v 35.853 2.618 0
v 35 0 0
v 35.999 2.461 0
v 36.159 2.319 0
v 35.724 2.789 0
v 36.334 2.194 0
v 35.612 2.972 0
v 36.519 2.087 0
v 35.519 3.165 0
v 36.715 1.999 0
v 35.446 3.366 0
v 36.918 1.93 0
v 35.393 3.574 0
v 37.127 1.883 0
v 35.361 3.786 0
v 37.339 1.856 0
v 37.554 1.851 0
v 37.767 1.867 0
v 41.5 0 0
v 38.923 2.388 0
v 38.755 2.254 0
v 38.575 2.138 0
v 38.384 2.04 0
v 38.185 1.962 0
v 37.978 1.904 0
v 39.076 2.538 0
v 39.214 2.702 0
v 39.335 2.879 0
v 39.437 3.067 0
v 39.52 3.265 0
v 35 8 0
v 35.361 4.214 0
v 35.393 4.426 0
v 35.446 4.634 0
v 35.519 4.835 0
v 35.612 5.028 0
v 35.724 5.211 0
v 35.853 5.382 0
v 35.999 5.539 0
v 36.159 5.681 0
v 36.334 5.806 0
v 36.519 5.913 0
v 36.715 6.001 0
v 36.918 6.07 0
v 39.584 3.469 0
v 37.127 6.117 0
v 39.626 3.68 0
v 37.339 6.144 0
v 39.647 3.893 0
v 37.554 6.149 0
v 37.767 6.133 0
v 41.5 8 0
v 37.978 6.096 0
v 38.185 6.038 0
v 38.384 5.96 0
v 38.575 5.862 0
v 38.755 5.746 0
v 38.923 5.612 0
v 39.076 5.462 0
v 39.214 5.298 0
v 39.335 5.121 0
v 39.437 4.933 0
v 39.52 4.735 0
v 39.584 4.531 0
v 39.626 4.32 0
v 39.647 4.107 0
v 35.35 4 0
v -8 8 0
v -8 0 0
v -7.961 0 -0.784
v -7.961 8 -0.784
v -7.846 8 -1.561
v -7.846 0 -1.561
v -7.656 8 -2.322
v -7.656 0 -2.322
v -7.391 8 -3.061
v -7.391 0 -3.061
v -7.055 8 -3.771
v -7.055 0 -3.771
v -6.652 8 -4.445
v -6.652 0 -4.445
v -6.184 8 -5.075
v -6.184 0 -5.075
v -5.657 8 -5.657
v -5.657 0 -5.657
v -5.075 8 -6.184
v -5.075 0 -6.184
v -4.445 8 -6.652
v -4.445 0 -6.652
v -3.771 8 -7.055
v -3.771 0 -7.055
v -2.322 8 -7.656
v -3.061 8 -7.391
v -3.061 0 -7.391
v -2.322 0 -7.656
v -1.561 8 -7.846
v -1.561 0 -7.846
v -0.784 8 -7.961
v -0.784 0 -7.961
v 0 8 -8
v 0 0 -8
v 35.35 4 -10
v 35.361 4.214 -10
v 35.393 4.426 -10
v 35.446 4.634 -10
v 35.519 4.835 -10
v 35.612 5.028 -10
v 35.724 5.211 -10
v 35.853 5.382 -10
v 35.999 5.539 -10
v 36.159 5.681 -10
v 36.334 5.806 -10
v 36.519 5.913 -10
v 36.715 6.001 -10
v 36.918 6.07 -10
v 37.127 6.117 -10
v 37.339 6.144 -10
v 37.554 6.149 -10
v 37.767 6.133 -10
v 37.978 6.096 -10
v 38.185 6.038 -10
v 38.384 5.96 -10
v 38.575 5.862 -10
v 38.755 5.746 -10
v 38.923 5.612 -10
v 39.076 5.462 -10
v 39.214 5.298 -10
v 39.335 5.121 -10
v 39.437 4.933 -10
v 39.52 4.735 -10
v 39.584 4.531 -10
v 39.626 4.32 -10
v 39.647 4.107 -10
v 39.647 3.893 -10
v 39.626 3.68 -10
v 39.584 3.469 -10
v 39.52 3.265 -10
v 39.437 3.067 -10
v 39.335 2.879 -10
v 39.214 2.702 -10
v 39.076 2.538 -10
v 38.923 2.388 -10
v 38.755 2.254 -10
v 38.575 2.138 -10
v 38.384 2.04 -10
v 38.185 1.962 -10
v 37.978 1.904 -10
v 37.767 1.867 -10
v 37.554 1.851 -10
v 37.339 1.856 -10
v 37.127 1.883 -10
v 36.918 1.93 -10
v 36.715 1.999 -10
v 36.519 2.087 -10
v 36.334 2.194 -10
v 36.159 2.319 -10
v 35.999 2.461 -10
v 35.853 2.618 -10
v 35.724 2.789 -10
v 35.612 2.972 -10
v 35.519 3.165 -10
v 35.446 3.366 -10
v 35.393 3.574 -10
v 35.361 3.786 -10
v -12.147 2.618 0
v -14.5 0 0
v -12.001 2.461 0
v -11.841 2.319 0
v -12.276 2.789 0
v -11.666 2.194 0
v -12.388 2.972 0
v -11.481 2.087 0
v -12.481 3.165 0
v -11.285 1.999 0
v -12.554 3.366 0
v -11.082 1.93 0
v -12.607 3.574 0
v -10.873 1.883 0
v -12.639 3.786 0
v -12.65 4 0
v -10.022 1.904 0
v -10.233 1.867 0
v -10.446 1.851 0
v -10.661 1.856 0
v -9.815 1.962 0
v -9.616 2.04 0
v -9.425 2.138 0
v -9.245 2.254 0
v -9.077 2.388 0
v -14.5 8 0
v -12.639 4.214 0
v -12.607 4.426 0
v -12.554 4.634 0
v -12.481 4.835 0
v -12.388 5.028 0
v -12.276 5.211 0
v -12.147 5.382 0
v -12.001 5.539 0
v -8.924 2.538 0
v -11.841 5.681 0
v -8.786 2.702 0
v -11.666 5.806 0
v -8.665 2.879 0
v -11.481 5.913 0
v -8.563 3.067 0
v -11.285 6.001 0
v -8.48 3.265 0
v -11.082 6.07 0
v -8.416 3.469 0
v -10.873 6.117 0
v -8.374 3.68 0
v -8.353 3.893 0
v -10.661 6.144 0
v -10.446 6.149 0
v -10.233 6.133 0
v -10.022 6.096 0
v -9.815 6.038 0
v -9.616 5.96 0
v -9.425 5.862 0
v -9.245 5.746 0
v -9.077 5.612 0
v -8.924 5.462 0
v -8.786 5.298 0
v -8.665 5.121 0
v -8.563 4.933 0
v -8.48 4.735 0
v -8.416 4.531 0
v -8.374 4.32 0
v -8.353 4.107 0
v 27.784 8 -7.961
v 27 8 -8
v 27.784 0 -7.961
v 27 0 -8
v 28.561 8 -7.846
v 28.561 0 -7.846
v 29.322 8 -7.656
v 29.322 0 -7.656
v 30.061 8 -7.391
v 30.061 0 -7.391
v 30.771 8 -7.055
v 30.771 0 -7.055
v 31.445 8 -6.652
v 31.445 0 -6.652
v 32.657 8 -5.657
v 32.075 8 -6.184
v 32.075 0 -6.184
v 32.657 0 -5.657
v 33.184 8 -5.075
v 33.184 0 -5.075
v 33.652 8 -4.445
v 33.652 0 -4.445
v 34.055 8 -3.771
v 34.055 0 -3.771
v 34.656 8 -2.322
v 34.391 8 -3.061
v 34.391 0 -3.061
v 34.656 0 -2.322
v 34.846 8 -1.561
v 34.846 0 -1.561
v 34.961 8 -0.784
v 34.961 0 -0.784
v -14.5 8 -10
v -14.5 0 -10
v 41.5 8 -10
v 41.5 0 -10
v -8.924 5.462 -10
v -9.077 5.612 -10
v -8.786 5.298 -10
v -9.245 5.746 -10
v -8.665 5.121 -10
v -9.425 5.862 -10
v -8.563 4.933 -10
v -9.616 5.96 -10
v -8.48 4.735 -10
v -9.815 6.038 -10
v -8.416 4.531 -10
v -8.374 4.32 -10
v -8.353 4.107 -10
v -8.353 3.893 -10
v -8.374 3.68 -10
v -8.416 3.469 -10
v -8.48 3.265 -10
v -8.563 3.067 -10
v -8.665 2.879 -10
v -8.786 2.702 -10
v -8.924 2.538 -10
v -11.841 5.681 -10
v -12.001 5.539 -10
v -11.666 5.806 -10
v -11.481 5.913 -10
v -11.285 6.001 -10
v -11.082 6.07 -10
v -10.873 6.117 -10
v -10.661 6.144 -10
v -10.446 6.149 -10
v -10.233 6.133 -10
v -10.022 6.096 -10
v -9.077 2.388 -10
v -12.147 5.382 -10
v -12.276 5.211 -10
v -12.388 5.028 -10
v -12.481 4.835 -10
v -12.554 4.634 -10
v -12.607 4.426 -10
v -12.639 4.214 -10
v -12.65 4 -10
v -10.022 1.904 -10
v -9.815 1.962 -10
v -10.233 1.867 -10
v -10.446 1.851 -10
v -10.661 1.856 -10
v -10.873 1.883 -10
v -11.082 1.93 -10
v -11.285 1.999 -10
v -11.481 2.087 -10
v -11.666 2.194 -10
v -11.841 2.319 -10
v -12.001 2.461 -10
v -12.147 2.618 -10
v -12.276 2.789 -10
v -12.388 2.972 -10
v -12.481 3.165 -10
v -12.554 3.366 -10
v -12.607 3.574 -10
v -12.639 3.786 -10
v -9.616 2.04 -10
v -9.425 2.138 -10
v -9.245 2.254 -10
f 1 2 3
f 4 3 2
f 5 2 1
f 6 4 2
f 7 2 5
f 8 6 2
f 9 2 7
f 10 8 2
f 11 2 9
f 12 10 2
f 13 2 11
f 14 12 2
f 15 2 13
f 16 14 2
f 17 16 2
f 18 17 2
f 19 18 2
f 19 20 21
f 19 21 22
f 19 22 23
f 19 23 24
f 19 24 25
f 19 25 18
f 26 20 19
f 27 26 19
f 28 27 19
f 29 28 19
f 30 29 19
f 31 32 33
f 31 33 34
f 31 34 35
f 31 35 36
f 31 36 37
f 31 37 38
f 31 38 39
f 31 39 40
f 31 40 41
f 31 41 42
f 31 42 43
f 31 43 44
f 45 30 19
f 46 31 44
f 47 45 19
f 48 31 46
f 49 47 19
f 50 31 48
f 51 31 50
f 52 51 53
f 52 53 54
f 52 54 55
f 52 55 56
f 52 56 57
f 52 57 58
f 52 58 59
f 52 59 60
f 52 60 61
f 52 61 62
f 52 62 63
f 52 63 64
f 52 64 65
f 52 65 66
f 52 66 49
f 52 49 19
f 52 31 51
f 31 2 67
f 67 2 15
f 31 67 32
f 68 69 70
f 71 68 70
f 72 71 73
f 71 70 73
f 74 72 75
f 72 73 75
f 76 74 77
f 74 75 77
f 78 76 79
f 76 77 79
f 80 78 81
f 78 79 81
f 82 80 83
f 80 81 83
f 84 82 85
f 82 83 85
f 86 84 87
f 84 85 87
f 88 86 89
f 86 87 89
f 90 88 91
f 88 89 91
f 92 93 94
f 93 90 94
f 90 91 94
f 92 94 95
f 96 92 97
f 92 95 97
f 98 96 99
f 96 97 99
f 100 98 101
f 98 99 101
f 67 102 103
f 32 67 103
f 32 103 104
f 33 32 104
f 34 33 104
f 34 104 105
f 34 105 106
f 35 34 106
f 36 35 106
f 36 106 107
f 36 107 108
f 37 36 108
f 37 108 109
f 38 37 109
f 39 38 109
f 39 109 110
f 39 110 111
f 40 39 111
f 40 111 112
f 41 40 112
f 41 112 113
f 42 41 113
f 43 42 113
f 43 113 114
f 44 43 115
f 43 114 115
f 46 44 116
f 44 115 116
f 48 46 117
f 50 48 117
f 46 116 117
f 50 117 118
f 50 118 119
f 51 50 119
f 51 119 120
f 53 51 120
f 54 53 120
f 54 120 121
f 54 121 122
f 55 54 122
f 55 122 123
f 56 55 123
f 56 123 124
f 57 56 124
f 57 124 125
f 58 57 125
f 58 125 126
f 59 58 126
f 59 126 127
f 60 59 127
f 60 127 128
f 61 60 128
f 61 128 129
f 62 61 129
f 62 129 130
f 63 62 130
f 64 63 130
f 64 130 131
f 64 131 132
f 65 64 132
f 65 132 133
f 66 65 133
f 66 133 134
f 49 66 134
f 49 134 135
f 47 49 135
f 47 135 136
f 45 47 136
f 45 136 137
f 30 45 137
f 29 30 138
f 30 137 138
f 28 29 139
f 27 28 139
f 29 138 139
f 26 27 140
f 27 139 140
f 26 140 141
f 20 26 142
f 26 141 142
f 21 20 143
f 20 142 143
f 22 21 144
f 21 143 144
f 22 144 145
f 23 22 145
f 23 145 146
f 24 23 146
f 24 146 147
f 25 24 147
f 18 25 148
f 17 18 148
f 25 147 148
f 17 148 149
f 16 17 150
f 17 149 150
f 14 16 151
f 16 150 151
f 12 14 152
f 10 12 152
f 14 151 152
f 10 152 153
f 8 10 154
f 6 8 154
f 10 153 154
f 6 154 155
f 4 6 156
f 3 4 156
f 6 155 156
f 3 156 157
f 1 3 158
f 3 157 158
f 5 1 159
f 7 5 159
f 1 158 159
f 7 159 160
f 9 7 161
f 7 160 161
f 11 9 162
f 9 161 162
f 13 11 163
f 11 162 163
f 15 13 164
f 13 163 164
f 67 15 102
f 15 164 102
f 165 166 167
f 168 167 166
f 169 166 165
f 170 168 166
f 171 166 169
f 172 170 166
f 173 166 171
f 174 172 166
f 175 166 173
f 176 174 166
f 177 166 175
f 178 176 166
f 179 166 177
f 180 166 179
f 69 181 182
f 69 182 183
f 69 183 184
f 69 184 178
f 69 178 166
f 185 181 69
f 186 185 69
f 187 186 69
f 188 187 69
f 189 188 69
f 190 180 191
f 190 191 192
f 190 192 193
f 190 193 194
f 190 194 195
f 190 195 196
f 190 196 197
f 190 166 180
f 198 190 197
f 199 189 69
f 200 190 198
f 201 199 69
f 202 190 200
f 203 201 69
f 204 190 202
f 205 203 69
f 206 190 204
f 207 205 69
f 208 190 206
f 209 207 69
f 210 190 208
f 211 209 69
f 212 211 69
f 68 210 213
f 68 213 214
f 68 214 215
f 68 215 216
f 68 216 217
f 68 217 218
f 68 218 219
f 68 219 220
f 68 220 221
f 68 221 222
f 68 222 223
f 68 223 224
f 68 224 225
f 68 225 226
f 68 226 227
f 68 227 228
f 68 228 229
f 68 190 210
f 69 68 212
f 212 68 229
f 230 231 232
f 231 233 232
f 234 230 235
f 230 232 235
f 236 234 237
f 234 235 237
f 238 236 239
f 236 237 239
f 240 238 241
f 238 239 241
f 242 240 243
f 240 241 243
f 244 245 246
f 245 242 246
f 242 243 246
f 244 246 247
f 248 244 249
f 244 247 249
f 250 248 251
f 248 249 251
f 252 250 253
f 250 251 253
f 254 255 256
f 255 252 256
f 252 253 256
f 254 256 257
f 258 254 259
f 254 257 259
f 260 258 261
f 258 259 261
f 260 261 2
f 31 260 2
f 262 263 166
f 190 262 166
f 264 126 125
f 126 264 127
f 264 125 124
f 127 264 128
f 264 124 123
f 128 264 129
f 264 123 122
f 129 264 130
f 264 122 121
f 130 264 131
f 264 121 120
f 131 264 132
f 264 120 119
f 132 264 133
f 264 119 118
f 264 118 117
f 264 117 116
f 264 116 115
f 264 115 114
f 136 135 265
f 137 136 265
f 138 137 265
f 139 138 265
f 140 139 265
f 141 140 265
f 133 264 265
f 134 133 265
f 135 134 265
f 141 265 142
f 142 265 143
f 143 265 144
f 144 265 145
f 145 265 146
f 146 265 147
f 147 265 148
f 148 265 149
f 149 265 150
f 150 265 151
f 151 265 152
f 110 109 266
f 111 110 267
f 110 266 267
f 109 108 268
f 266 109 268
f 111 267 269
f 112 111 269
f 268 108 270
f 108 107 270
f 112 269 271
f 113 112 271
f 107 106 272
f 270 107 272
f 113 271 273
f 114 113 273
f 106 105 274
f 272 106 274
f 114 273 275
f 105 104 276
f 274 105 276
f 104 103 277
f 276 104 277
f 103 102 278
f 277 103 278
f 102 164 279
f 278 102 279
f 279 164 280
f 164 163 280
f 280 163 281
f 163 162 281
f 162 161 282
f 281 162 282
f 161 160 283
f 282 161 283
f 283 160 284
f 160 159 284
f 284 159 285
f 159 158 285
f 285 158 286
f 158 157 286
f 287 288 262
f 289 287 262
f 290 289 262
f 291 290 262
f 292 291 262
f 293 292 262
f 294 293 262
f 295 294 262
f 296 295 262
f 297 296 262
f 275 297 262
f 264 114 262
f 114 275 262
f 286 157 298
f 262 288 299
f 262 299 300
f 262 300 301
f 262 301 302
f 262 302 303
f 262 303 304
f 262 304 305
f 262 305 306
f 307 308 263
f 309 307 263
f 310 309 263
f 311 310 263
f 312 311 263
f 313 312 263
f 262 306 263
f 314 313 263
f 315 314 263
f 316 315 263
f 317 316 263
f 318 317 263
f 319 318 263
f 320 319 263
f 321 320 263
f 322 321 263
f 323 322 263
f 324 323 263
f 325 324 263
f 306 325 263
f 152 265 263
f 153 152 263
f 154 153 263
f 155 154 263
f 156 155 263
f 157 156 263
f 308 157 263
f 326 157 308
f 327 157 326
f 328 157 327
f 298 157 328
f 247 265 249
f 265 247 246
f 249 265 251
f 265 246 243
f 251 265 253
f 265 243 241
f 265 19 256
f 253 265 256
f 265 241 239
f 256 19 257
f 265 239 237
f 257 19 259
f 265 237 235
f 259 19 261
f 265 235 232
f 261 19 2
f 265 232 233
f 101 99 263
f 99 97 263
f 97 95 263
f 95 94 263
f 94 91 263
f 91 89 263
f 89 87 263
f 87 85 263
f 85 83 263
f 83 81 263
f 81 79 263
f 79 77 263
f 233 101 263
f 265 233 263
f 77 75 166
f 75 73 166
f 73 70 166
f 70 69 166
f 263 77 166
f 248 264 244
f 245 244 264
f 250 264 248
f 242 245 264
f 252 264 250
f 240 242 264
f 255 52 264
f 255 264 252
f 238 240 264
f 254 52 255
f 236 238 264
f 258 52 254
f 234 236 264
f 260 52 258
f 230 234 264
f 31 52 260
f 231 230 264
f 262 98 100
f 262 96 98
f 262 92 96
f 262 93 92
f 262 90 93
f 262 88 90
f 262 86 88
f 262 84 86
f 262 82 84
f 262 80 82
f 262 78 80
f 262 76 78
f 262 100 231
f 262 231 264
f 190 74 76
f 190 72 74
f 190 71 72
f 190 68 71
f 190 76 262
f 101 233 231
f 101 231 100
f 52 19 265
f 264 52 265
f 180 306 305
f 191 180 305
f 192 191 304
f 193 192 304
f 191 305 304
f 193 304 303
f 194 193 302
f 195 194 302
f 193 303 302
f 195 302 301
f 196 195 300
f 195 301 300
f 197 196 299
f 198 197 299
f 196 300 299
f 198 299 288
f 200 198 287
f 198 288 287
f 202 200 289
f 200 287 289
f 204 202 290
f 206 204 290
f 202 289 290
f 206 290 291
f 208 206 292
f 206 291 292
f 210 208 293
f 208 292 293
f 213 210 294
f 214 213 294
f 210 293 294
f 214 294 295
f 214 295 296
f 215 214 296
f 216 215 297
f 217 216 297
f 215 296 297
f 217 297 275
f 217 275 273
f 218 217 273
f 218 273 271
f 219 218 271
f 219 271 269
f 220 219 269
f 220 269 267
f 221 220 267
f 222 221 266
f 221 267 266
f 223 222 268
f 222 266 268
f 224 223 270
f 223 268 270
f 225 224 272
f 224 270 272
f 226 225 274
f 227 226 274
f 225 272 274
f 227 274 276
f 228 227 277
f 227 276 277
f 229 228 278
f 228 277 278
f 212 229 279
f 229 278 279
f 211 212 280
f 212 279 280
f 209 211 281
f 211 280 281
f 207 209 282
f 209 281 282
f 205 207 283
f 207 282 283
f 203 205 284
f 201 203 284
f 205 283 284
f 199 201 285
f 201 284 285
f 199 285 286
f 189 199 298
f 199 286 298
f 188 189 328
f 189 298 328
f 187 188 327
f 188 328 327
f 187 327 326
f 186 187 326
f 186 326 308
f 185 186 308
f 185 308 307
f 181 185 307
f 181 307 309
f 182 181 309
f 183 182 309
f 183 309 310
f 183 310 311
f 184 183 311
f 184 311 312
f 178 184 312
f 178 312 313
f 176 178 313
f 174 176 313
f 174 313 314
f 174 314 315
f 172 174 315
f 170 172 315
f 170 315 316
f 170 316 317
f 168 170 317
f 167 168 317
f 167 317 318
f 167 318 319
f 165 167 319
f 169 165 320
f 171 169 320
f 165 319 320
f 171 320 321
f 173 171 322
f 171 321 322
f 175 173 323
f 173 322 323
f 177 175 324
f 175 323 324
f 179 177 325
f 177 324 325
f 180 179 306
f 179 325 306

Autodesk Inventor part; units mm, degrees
ref_plane "YZ Plane" through (0, 0, 0) normal (1, 0, 0) x (0, 1, 0)
ref_plane "XZ Plane" through (0, 0, 0) normal (0, 1, 0) x (-1, 0, 0)
ref_plane "XY Plane" through (0, 0, 0) normal (0, 0, 1) x (1, 0, 0)
sketch "Sketch1" plane through (0, 0, 0) normal (0, 1, 0) x (-1, 0, 0)
  line L0 (0, 0) -> (-27, 0) construction
  line L1 (-27, -8) -> (0, -8)
  arc A0 (0, -8) -> (0, 8) centre (0, 0) ccw
  arc A1 (-27, 8) -> (-27, -8) centre (-27, 0) ccw
  line L2 (14.5, 10) -> (-41.5, 10)
  line L3 (-41.5, 10) -> (-41.5, -10)
  line L4 (-41.5, -10) -> (14.5, -10)
  line L5 (14.5, -10) -> (14.5, 10)
  line L6 (14.5, 10) -> (-41.5, -10) construction
  line L7 (-41.5, 10) -> (14.5, -10) construction
  line L8 (14.5, 10) -> (-41.5, 10)
  line L9 (-41.5, 10) -> (-41.5, 15)
  line L10 (-41.5, 15) -> (14.5, 15)
  line L11 (14.5, 15) -> (14.5, 10)
  arc A2 (0, -8) -> (-5.3358, 5.9607) centre (0, 0) ccw
  arc A3 (-21.6642, 5.9607) -> (-27, -8) centre (-27, 0) ccw
  line L12 (9, -10) -> (-36, -10)
  line L13 (-36, -10) -> (-36, 10) construction
  line L14 (-36, 10) -> (9, 10)
  line L15 (9, 10) -> (9, -10) construction
  line L16 (9, -10) -> (-36, 10) construction
  line L17 (-36, -10) -> (9, 10) construction
  line L18 (9, 10) -> (-6, 10)
  line L19 (-6, 10) -> (-6, 5.9607)
  line L20 (-36, 10) -> (-21, 10)
  line L21 (-21, 10) -> (-21, 5.9607)
  line L22 (-5.3358, 5.9607) -> (-21.6642, 5.9607) construction
  line L23 (-21, 5.9607) -> (-21.6642, 5.9607)
  line L24 (-6, 5.9607) -> (-5.3358, 5.9607)
  point P0 (-13.5, 0)
  point P1 (-27, 8)
  point P2 (0, 8)
  dimension "d0" = 27
  dimension "d1" = 16
  dimension "d2" = 56
  dimension "d3" = 20
  dimension "d4" = 5
  dimension "d5" = 45
  dimension "d6" = 15
  dimension "d7" = 15
extrude "Extrusion1" add sketch "Sketch1" along normal blind 8 contours L1 A0 A2 L24 L19 L2 L5 L4 L3 L21 L23 A3 A1
extrude "Extrusion2" add sketch "Sketch1" along normal blind 15.5 contours L2 L9 L10 L11
sketch "Sketch2" plane through (21, 0, 10) normal (0, 0, -1) x (-1, 0, 0)
  line L0 (35.5, 8) -> (15, 8) projected
  line L1 (-20.5, 8) -> (-20.5, 15.5) projected
  line L2 (35.5, 8) -> (-20.5, 8)
  line L3 (-20.5, 8) -> (-20.5, 15.5)
  line L4 (-20.5, 15.5) -> (35.5, 15.5)
  line L5 (35.5, 15.5) -> (35.5, 8)
  line L6 (31, 8) -> (-16, 8)
  line L7 (-16, 8) -> (-16, 12.5)
  line L8 (-16, 12.5) -> (31, 12.5)
  line L9 (31, 12.5) -> (31, 8)
  line L10 (-20.5, 8) -> (35.5, 8) projected
  point P0 (21, 0)
  point P1 (7.5, 8)
  dimension "d12" = 47
  dimension "d13" = 4.5
extrude "Extrusion3" add sketch "Sketch2" along normal blind 3 contours L0 L9 L8 L7 L2 L1 L4 L5
sketch "Sketch3" plane through (41.5, 0, -10) normal (0, 0, -1) x (-1, 0, 0)
  circle A0 centre (52, 4) radius 2.15
  line L0 (56, 0) -> (56, 8) projected
  line L1 (0, 0) -> (56, 0) projected
  circle A1 centre (4, 4) radius 2.15
  line L2 (0, 0) -> (0, 8) projected
  point P0 (41.5, 0)
  dimension "d16" = 4.3
  dimension "d17" = 4
  dimension "d18" = 4
  dimension "d19" = 4.3
  dimension "d20" = 4
  dimension "d21" = 4
extrude "Extrusion4" cut sketch "Sketch3" against normal blind 32
sketch "Sketch4" plane through (-14.5, 0, 15) normal (0, 0, 1) x (1, 0, 0)
  circle A0 centre (4, 12) radius 1.95
  circle A1 centre (4, 4) radius 2.15 projected
  line L0 (0, 0) -> (0, 15.5) projected
  circle A2 centre (52, 12) radius 1.95
  circle A3 centre (52, 4) radius 2.15 projected
  line L1 (56, 0) -> (56, 15.5) projected
  line L2 (0, 15.5) -> (56, 15.5) projected
  point P0 (14.5, 0)
  dimension "d24" = 3.9
  dimension "d25" = 8
  dimension "d26" = 4
  dimension "d27" = 3.9
  dimension "d28" = 8
  dimension "d29" = 4
  dimension "d30" = 3.5
  dimension "d31" = 3.5
extrude "Extrusion5" add sketch "Sketch4" along normal blind 2 contours A0 | A2
sketch "Sketch5" plane through (0, 15.5, 0) normal (0, 1, 0) x (1, 0, 0)
  line L0 (-14.5, 10) -> (-14.5, -7) projected
  line L1 (-14.5, 0) -> (41.5, 0)
  line L2 (41.5, 0) -> (41.5, -17)
  line L3 (41.5, -17) -> (-14.5, -17)
  line L4 (-14.5, -17) -> (-14.5, 0)
  point P0 (0, 0)
  dimension "d34" = 17
extrude "Extrusion6" cut sketch "Sketch5" against normal blind 27
properties part number "Ultrasonic_sensor_frame_Top"
